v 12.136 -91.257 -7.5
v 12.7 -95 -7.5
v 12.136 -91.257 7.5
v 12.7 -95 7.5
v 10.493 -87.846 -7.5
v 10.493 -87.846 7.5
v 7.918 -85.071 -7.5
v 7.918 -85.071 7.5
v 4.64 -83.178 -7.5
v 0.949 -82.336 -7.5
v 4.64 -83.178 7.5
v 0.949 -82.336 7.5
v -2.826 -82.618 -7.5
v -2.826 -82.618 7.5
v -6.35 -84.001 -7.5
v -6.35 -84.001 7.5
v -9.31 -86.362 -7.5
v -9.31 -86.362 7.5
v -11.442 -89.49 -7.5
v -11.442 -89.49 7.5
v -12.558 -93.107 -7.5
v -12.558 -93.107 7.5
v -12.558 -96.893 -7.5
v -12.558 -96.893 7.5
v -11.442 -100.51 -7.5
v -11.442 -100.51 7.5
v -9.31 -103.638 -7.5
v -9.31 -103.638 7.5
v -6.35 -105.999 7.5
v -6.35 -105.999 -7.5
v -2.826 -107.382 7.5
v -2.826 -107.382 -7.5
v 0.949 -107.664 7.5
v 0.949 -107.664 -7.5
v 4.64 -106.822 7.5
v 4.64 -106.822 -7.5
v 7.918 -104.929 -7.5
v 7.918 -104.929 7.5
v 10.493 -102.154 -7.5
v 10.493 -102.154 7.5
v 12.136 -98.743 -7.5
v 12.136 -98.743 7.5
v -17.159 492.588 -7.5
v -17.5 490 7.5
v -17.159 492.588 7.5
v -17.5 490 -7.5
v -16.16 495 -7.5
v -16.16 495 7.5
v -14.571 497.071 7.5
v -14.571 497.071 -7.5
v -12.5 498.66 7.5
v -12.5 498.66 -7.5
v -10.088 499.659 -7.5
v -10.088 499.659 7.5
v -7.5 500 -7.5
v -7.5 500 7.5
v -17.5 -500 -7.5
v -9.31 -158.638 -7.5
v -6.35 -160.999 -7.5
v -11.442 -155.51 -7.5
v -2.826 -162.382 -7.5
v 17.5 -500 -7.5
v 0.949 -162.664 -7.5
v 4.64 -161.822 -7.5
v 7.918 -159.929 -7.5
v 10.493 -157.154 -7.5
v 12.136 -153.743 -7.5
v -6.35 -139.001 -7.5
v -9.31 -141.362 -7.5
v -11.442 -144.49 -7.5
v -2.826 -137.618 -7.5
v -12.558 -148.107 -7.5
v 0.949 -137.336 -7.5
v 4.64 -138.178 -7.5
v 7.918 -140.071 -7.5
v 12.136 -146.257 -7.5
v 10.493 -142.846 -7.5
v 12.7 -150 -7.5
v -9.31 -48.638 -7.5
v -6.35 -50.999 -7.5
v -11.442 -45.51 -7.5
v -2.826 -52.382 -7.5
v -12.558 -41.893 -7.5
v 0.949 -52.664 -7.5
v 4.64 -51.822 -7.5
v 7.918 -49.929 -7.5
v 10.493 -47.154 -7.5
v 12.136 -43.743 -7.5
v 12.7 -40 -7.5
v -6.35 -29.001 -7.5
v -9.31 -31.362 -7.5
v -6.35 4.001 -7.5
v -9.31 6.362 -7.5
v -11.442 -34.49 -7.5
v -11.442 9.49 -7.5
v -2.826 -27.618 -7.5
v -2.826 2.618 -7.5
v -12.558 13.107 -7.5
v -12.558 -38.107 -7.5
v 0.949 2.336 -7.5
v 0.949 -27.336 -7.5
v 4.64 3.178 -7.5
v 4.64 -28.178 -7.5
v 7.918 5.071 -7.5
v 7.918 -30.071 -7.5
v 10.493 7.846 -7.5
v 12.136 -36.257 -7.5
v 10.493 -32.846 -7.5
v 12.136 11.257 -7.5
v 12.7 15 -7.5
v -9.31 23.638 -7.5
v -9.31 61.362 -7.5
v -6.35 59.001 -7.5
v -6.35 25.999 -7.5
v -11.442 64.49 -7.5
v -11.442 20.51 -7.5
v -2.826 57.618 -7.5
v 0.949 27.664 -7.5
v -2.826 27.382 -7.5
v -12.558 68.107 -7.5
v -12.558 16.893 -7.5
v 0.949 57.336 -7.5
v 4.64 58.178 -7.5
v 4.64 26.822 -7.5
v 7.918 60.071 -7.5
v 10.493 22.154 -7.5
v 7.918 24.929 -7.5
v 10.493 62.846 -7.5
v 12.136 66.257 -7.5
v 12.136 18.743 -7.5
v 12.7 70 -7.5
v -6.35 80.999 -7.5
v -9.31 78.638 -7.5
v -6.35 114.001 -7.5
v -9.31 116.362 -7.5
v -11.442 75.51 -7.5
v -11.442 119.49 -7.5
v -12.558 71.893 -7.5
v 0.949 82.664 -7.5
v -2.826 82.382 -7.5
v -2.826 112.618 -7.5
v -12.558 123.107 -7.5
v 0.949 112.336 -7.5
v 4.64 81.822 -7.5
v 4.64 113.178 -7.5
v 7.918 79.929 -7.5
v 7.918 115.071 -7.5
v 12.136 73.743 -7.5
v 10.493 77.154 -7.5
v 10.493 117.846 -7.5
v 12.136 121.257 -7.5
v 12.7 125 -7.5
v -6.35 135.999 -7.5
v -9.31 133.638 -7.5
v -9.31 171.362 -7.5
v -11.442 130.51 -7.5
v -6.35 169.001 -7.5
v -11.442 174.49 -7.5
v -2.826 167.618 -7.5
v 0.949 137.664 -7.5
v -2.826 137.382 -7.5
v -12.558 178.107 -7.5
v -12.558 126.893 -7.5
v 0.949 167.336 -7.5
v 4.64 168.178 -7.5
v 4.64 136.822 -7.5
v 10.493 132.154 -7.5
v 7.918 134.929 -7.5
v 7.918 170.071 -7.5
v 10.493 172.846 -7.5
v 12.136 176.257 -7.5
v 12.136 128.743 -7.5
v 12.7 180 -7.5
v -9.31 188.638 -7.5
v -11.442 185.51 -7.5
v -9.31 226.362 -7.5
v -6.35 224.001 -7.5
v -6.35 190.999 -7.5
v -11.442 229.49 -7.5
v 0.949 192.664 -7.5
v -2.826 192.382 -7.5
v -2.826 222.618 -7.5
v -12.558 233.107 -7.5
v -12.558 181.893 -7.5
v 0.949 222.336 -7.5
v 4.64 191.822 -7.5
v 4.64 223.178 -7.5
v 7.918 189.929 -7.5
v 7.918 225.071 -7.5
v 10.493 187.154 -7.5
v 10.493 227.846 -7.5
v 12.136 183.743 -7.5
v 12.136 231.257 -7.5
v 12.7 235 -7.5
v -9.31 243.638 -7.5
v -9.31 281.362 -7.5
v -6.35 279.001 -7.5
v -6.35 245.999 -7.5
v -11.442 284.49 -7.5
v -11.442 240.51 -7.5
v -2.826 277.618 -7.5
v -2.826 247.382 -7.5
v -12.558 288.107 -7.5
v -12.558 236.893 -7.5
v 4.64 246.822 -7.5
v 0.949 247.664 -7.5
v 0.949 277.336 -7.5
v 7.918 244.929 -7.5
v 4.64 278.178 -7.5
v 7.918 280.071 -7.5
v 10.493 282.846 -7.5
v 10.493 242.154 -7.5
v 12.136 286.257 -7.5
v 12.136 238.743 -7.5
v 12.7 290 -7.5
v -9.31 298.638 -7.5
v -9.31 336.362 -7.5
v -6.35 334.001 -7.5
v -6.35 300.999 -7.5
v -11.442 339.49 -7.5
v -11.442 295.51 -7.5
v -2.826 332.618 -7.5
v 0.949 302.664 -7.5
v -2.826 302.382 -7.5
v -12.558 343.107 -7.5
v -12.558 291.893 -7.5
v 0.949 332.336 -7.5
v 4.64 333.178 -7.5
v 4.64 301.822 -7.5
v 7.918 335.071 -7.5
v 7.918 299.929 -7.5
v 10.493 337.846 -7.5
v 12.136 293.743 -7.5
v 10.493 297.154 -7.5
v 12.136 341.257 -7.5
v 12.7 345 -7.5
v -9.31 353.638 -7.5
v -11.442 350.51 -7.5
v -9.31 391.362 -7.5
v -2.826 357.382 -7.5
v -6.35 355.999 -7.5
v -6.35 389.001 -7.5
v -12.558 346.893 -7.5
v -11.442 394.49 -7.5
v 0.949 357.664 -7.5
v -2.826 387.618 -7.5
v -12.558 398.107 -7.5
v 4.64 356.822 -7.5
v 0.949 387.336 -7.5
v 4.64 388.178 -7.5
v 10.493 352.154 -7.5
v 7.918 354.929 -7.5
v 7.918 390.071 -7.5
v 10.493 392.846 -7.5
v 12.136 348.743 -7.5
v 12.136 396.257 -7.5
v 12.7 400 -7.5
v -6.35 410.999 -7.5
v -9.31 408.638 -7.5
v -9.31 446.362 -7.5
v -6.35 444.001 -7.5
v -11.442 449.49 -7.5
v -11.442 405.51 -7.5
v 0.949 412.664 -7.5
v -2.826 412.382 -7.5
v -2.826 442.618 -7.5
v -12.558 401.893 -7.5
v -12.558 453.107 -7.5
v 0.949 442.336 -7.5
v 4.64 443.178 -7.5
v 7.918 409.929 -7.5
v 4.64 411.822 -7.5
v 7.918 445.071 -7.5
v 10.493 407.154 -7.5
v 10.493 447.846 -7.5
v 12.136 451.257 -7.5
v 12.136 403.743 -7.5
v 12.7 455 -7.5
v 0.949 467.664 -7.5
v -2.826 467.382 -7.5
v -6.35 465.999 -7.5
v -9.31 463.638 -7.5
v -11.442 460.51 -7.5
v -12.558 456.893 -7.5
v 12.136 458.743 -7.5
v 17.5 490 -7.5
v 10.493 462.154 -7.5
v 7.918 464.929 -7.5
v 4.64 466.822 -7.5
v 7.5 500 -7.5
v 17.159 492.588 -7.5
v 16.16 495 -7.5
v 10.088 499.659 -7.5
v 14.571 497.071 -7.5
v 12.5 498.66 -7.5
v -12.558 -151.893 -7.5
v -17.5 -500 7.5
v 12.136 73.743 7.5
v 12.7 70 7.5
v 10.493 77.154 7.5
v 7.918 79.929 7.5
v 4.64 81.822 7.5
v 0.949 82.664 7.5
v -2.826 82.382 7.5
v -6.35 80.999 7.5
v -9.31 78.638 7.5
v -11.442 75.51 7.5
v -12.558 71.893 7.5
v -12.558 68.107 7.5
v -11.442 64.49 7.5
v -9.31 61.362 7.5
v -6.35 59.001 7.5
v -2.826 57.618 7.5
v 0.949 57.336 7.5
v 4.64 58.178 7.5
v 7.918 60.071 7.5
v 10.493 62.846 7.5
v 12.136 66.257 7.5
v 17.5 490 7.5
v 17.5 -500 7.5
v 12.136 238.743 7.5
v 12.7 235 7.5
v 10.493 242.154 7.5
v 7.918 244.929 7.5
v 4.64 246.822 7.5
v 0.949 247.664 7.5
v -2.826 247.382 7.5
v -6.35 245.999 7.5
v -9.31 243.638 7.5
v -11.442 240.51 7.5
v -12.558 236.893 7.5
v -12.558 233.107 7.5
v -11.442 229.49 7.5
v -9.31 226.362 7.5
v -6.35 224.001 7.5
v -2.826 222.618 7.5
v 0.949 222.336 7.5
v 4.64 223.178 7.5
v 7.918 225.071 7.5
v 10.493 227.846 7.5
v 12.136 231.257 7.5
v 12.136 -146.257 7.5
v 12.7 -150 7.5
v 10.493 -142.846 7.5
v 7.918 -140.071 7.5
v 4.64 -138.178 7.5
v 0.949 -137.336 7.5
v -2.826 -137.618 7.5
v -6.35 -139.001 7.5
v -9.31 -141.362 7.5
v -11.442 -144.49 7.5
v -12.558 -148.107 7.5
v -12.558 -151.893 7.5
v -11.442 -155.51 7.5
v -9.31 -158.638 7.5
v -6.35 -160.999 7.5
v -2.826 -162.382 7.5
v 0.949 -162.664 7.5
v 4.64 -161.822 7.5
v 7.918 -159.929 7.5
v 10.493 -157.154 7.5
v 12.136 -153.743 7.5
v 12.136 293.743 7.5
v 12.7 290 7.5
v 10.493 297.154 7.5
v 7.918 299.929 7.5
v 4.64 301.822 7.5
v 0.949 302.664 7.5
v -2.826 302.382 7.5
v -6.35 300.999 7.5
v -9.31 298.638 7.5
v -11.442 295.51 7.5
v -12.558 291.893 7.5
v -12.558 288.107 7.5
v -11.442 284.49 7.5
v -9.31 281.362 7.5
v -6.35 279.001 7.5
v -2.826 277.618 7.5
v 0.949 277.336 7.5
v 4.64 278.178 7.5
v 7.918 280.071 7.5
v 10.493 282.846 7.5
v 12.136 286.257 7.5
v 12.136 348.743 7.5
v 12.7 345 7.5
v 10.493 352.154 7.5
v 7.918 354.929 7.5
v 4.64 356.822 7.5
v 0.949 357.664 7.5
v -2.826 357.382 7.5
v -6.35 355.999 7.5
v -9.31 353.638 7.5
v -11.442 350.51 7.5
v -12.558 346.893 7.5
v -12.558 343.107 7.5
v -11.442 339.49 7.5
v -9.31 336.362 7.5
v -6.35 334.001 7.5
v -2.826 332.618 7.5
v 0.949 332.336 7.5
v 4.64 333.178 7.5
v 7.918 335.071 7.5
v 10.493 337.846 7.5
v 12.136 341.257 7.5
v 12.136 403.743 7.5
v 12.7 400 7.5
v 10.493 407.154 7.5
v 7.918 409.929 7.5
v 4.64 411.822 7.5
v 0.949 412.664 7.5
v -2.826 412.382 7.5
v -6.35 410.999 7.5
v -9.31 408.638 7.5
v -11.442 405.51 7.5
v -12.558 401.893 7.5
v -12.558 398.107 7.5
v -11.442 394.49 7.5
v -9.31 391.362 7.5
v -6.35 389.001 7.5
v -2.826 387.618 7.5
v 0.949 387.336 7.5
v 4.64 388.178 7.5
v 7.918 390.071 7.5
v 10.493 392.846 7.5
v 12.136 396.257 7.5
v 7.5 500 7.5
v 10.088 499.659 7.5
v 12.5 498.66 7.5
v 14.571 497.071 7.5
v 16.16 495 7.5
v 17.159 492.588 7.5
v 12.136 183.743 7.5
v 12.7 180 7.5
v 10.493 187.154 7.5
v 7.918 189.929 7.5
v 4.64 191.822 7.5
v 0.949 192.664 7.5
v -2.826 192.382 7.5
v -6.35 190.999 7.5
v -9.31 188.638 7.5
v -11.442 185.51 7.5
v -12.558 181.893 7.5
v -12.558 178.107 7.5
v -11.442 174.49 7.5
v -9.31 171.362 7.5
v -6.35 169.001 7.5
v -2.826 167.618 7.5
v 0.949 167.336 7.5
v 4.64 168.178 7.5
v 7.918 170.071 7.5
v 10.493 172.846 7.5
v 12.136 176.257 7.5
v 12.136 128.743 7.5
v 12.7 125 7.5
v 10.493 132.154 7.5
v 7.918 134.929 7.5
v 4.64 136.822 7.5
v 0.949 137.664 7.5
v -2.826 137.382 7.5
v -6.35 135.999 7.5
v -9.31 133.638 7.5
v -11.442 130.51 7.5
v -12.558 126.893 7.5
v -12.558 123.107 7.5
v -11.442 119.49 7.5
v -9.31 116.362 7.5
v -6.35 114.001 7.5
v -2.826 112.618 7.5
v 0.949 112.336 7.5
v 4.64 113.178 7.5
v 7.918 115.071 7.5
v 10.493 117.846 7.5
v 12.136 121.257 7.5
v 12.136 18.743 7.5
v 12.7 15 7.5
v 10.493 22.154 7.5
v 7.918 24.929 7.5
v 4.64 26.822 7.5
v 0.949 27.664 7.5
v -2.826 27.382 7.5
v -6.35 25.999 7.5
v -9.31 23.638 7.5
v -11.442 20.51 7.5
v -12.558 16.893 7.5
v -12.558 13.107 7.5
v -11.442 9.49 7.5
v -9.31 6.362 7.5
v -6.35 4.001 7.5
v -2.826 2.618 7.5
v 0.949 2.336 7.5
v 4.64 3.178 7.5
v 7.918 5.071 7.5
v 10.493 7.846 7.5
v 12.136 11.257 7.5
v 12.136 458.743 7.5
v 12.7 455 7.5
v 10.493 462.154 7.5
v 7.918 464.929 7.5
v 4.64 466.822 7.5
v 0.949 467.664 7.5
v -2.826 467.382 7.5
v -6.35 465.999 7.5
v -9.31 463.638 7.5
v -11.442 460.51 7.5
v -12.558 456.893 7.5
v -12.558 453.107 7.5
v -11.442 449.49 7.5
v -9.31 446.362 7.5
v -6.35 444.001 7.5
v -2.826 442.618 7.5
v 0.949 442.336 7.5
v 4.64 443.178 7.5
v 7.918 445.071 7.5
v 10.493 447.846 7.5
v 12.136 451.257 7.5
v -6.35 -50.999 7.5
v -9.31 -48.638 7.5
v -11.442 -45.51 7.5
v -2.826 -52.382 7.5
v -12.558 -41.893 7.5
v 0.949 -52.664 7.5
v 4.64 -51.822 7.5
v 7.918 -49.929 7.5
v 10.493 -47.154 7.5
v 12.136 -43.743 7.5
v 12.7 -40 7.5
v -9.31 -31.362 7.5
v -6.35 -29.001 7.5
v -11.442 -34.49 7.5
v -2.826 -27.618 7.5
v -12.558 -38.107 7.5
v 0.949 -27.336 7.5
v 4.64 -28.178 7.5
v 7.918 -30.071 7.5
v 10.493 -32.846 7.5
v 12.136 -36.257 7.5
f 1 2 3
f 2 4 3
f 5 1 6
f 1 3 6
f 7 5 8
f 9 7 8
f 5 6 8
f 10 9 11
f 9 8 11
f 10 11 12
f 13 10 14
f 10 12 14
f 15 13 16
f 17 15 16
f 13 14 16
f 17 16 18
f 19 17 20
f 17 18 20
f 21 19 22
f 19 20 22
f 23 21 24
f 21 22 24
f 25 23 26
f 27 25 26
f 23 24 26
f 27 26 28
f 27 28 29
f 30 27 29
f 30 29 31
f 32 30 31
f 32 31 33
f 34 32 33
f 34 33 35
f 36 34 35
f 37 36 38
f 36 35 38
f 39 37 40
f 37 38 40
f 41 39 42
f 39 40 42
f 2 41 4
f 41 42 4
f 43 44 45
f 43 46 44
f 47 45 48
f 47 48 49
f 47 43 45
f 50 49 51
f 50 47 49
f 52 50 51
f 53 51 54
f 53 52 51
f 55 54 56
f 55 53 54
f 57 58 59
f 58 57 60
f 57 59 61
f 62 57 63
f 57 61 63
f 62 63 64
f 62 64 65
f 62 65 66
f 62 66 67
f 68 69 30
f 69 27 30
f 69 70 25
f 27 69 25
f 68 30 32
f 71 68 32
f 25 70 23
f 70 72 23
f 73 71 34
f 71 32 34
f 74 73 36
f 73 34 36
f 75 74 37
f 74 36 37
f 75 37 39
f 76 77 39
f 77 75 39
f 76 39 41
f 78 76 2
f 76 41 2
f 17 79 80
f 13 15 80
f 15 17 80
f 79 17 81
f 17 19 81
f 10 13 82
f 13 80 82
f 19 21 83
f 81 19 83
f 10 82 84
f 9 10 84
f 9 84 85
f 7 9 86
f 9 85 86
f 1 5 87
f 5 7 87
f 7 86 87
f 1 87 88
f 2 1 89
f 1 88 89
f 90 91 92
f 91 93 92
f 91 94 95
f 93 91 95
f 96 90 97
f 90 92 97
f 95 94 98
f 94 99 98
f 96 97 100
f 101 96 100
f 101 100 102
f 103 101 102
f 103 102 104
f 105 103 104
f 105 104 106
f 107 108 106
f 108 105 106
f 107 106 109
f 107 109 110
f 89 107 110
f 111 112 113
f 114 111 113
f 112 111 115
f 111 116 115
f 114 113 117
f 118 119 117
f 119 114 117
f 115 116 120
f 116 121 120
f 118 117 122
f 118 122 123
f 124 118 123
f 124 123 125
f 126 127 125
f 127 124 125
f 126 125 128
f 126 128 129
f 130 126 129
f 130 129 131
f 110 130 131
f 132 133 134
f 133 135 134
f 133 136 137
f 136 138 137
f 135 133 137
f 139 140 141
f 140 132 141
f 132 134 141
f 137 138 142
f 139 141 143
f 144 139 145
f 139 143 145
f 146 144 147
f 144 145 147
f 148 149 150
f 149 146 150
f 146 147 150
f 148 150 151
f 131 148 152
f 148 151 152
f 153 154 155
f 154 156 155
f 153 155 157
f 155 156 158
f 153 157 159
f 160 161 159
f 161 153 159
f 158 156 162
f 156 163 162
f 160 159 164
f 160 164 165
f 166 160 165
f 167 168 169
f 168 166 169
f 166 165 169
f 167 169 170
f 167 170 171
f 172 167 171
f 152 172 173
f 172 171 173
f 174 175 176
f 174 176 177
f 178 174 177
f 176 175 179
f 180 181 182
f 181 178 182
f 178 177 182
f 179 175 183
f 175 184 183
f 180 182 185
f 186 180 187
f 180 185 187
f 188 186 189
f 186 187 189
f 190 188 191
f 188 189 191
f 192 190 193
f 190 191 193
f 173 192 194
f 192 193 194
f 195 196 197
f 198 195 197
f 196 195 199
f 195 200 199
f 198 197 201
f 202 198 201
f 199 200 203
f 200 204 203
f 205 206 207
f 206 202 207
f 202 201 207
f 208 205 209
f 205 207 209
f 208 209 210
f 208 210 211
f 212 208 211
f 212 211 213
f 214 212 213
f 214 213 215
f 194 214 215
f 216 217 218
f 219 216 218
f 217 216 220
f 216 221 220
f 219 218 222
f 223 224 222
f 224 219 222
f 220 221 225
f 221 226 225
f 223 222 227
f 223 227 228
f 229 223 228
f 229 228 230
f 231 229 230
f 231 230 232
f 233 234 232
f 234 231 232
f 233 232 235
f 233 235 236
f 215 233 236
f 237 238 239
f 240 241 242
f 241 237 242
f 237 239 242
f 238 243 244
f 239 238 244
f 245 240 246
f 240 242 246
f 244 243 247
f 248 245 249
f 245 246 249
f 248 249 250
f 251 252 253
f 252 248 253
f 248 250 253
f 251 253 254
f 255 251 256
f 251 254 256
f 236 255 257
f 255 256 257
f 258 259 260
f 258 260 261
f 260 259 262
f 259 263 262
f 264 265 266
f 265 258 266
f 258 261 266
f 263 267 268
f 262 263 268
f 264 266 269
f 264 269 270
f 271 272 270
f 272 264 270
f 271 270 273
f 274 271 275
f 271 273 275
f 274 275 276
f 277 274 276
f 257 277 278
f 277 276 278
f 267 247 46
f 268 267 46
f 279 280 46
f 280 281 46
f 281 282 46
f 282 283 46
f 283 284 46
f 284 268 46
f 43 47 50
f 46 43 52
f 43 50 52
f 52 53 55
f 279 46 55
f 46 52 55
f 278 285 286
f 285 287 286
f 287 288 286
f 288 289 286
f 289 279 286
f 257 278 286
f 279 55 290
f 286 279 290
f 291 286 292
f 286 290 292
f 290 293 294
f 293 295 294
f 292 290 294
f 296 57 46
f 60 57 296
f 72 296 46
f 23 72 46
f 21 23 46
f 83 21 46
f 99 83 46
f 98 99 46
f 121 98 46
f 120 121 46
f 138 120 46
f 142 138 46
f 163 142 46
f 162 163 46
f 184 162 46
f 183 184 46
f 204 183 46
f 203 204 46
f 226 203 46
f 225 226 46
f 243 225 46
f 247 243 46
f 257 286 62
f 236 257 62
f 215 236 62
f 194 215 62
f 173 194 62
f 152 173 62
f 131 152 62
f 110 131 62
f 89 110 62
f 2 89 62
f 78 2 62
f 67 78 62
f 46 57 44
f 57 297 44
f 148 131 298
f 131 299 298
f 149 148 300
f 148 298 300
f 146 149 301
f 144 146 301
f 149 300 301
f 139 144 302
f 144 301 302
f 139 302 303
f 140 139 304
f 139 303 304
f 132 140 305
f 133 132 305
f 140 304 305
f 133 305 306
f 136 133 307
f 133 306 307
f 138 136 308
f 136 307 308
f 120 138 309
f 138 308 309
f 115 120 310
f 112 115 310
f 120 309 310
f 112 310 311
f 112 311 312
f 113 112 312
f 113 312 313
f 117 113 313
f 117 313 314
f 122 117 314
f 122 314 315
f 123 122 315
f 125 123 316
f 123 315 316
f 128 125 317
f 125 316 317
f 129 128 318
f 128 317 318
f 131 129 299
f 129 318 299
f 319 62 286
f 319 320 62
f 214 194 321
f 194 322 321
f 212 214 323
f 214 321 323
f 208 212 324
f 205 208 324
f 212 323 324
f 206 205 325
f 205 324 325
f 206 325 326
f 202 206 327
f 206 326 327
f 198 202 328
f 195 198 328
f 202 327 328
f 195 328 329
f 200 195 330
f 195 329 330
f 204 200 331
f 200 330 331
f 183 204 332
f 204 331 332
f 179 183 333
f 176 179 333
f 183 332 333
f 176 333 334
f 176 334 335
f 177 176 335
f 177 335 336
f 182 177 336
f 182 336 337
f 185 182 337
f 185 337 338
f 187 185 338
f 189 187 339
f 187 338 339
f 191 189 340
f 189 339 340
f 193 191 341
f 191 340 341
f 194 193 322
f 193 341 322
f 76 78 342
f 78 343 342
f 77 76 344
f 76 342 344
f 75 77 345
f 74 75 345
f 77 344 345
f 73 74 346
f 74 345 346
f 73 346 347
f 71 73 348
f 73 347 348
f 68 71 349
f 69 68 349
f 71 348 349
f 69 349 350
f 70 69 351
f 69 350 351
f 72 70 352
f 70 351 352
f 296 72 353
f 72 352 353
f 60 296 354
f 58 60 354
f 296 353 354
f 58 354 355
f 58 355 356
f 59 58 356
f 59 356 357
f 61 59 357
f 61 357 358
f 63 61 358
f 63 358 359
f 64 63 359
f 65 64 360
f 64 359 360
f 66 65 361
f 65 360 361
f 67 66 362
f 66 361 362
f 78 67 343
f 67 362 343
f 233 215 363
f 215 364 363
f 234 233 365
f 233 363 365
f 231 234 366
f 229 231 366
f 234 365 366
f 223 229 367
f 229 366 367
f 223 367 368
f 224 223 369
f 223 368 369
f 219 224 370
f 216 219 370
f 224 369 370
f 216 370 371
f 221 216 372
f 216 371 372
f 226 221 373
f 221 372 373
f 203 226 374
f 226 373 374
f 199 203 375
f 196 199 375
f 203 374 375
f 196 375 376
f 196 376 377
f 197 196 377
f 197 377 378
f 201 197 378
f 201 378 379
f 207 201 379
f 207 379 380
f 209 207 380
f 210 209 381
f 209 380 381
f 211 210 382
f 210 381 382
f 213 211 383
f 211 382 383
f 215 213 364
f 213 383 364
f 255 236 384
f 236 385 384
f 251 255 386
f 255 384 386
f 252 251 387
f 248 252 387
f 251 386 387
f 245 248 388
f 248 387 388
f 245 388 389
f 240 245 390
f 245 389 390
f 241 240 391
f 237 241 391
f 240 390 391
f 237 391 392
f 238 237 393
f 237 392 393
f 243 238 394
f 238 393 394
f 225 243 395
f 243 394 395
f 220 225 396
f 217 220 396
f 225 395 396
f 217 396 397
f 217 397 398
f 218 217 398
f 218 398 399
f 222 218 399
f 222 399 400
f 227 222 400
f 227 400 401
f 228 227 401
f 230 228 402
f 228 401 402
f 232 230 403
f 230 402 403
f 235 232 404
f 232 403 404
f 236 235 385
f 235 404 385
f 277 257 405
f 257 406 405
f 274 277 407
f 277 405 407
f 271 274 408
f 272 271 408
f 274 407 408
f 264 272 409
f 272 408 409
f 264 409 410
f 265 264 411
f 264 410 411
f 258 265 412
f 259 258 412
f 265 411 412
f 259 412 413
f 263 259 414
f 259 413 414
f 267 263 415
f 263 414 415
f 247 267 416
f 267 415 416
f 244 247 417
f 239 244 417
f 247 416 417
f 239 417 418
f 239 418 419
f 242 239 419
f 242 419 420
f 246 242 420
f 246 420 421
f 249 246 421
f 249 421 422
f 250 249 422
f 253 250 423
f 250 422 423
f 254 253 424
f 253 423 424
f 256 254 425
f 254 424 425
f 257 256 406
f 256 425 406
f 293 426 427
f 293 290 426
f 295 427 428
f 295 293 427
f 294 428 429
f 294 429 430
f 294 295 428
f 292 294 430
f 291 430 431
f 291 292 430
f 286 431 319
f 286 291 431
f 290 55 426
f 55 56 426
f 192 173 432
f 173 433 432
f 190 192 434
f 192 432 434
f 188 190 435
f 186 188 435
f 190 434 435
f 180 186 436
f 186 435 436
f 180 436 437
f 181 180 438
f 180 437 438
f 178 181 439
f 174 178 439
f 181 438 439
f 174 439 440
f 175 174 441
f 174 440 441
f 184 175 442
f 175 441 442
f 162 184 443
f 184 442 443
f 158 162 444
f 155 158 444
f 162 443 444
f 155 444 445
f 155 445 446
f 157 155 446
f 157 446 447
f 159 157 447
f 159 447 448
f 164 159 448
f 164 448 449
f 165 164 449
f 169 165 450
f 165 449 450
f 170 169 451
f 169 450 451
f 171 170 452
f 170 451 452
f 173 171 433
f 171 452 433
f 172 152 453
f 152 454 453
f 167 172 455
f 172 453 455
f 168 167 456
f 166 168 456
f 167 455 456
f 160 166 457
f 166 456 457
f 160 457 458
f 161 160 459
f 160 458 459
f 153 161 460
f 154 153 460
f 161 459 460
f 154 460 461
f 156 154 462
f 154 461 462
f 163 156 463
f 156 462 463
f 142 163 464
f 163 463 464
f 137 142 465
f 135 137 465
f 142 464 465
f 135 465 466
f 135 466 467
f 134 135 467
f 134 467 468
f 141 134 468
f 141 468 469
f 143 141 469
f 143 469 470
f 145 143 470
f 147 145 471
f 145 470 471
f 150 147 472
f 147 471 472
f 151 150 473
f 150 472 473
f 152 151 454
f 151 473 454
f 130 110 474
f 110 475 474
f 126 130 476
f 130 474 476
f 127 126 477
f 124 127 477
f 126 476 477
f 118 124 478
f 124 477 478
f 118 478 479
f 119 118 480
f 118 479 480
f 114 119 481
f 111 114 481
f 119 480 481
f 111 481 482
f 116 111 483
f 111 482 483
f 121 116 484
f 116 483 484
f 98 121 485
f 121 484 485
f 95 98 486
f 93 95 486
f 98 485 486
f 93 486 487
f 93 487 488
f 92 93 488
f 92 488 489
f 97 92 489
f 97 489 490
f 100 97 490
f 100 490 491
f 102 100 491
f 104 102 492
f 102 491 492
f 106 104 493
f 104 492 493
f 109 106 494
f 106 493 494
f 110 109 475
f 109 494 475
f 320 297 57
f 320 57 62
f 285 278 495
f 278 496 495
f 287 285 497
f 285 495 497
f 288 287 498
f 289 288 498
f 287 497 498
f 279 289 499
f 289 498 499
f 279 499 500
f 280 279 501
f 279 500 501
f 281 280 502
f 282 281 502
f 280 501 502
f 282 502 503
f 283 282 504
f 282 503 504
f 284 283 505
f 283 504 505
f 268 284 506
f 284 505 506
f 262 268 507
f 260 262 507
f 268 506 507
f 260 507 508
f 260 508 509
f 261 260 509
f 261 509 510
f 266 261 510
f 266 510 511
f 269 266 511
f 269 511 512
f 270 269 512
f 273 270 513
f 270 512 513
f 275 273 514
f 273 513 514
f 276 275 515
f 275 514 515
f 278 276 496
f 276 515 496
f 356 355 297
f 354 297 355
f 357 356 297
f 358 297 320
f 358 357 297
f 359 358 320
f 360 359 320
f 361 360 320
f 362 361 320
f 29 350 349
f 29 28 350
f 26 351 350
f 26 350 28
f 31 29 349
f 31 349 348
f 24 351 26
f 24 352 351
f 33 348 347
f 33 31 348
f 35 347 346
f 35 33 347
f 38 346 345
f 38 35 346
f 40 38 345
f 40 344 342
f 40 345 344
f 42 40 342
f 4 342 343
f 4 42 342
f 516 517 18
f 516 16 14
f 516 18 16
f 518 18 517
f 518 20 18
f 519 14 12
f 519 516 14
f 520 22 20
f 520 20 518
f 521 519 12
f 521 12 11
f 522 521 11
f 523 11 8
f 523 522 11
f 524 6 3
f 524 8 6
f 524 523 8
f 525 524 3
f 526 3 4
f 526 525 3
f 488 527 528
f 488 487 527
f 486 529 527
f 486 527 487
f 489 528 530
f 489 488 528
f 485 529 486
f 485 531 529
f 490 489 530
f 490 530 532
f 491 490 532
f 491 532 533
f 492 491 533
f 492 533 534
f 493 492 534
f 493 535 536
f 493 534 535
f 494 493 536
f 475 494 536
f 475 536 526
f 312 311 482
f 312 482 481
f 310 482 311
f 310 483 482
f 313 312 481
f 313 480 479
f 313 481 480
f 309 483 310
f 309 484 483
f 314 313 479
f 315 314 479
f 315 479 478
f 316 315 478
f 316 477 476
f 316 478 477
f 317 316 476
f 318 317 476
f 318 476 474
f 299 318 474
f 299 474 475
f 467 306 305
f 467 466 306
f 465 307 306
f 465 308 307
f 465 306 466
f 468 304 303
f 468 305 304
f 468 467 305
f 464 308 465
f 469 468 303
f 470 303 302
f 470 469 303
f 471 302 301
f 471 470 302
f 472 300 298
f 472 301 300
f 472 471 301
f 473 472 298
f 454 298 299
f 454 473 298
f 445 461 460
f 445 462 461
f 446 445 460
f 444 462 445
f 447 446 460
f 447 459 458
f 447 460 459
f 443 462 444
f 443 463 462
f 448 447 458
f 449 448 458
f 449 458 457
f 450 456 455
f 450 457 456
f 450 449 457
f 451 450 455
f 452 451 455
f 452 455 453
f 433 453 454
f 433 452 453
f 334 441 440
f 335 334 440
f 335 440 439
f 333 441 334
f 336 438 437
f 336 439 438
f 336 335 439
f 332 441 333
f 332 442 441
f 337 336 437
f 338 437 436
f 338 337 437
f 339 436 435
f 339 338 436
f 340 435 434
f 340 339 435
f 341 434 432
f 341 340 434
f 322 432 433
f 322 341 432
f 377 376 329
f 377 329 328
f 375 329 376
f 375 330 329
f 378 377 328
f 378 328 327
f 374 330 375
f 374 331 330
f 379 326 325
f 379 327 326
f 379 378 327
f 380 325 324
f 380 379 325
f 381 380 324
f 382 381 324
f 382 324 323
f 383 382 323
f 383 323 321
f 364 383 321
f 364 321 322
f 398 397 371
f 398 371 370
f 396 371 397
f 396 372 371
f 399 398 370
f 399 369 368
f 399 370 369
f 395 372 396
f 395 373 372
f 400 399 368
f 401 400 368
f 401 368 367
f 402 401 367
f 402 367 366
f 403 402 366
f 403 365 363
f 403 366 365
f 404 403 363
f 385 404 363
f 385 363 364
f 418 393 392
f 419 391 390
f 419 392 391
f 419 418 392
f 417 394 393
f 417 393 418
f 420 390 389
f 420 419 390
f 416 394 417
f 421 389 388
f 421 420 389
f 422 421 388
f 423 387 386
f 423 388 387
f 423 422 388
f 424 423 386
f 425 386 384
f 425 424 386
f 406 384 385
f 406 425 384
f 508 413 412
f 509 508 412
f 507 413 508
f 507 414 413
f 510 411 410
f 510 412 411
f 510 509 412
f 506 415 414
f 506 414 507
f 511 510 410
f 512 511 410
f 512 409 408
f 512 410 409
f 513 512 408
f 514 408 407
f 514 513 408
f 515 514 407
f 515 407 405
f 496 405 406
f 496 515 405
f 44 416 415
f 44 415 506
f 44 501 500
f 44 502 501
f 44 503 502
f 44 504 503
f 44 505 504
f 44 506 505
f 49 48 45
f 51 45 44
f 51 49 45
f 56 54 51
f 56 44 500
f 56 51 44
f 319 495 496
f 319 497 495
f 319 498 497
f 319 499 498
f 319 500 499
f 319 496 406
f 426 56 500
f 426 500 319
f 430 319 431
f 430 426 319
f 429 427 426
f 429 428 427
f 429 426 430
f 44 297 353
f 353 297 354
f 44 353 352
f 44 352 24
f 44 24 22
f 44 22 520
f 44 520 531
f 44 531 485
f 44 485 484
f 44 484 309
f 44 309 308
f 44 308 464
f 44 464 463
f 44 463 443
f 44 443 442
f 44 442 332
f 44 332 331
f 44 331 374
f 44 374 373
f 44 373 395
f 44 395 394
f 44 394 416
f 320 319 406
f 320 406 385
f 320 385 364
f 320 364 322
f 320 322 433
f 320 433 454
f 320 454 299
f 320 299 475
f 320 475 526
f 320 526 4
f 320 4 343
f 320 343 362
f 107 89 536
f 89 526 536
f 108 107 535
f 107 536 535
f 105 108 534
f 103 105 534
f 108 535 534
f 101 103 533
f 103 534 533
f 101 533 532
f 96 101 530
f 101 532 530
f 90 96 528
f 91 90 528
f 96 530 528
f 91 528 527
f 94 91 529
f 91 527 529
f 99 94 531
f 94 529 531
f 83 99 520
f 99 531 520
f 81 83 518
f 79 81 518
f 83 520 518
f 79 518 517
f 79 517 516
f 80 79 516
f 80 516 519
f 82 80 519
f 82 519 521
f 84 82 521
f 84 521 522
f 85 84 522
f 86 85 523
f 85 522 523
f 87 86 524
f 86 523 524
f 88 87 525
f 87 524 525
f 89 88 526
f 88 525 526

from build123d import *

# Parameters (mm, degrees)
SKETCH1_W           = 35
SKETCH1_H           = 1000
BOSS_EXTRUDE1_DEPTH = 7.5
SKETCH2_R           = 12.7
CUT_EXTRUDE1_DEPTH  = 8.5
LPATTERN1_COUNT     = 12
LPATTERN1_PITCH     = 55
FILLET1_R           = 10


with BuildPart() as part:
    # Sketch1 → Boss-Extrude1 (new body, symmetric)
    with BuildSketch(Plane.XY):
        Rectangle(SKETCH1_W, SKETCH1_H)
    extrude(amount=BOSS_EXTRUDE1_DEPTH, both=True)

    # Sketch2 → Cut-Extrude1 (cut, symmetric)
    with BuildSketch(Plane.XY):
        with Locations((0, -150)):
            Circle(SKETCH2_R)
    cut_extrude1 = extrude(amount=CUT_EXTRUDE1_DEPTH, both=True, mode=Mode.SUBTRACT)

    # LPattern1: Cut-Extrude1 ×12
    with Locations(*[(0, i * LPATTERN1_PITCH, 0) for i in range(1, LPATTERN1_COUNT)]):
        add(cut_extrude1, mode=Mode.SUBTRACT)

    # Fillet1
    fillet1_edges = [part.edges().sort_by_distance(p)[0] for p in [
        (-17.5, 500, 0),
        (17.5, 500, 0),
    ]]
    fillet(fillet1_edges, radius=FILLET1_R)


solid = part.part
